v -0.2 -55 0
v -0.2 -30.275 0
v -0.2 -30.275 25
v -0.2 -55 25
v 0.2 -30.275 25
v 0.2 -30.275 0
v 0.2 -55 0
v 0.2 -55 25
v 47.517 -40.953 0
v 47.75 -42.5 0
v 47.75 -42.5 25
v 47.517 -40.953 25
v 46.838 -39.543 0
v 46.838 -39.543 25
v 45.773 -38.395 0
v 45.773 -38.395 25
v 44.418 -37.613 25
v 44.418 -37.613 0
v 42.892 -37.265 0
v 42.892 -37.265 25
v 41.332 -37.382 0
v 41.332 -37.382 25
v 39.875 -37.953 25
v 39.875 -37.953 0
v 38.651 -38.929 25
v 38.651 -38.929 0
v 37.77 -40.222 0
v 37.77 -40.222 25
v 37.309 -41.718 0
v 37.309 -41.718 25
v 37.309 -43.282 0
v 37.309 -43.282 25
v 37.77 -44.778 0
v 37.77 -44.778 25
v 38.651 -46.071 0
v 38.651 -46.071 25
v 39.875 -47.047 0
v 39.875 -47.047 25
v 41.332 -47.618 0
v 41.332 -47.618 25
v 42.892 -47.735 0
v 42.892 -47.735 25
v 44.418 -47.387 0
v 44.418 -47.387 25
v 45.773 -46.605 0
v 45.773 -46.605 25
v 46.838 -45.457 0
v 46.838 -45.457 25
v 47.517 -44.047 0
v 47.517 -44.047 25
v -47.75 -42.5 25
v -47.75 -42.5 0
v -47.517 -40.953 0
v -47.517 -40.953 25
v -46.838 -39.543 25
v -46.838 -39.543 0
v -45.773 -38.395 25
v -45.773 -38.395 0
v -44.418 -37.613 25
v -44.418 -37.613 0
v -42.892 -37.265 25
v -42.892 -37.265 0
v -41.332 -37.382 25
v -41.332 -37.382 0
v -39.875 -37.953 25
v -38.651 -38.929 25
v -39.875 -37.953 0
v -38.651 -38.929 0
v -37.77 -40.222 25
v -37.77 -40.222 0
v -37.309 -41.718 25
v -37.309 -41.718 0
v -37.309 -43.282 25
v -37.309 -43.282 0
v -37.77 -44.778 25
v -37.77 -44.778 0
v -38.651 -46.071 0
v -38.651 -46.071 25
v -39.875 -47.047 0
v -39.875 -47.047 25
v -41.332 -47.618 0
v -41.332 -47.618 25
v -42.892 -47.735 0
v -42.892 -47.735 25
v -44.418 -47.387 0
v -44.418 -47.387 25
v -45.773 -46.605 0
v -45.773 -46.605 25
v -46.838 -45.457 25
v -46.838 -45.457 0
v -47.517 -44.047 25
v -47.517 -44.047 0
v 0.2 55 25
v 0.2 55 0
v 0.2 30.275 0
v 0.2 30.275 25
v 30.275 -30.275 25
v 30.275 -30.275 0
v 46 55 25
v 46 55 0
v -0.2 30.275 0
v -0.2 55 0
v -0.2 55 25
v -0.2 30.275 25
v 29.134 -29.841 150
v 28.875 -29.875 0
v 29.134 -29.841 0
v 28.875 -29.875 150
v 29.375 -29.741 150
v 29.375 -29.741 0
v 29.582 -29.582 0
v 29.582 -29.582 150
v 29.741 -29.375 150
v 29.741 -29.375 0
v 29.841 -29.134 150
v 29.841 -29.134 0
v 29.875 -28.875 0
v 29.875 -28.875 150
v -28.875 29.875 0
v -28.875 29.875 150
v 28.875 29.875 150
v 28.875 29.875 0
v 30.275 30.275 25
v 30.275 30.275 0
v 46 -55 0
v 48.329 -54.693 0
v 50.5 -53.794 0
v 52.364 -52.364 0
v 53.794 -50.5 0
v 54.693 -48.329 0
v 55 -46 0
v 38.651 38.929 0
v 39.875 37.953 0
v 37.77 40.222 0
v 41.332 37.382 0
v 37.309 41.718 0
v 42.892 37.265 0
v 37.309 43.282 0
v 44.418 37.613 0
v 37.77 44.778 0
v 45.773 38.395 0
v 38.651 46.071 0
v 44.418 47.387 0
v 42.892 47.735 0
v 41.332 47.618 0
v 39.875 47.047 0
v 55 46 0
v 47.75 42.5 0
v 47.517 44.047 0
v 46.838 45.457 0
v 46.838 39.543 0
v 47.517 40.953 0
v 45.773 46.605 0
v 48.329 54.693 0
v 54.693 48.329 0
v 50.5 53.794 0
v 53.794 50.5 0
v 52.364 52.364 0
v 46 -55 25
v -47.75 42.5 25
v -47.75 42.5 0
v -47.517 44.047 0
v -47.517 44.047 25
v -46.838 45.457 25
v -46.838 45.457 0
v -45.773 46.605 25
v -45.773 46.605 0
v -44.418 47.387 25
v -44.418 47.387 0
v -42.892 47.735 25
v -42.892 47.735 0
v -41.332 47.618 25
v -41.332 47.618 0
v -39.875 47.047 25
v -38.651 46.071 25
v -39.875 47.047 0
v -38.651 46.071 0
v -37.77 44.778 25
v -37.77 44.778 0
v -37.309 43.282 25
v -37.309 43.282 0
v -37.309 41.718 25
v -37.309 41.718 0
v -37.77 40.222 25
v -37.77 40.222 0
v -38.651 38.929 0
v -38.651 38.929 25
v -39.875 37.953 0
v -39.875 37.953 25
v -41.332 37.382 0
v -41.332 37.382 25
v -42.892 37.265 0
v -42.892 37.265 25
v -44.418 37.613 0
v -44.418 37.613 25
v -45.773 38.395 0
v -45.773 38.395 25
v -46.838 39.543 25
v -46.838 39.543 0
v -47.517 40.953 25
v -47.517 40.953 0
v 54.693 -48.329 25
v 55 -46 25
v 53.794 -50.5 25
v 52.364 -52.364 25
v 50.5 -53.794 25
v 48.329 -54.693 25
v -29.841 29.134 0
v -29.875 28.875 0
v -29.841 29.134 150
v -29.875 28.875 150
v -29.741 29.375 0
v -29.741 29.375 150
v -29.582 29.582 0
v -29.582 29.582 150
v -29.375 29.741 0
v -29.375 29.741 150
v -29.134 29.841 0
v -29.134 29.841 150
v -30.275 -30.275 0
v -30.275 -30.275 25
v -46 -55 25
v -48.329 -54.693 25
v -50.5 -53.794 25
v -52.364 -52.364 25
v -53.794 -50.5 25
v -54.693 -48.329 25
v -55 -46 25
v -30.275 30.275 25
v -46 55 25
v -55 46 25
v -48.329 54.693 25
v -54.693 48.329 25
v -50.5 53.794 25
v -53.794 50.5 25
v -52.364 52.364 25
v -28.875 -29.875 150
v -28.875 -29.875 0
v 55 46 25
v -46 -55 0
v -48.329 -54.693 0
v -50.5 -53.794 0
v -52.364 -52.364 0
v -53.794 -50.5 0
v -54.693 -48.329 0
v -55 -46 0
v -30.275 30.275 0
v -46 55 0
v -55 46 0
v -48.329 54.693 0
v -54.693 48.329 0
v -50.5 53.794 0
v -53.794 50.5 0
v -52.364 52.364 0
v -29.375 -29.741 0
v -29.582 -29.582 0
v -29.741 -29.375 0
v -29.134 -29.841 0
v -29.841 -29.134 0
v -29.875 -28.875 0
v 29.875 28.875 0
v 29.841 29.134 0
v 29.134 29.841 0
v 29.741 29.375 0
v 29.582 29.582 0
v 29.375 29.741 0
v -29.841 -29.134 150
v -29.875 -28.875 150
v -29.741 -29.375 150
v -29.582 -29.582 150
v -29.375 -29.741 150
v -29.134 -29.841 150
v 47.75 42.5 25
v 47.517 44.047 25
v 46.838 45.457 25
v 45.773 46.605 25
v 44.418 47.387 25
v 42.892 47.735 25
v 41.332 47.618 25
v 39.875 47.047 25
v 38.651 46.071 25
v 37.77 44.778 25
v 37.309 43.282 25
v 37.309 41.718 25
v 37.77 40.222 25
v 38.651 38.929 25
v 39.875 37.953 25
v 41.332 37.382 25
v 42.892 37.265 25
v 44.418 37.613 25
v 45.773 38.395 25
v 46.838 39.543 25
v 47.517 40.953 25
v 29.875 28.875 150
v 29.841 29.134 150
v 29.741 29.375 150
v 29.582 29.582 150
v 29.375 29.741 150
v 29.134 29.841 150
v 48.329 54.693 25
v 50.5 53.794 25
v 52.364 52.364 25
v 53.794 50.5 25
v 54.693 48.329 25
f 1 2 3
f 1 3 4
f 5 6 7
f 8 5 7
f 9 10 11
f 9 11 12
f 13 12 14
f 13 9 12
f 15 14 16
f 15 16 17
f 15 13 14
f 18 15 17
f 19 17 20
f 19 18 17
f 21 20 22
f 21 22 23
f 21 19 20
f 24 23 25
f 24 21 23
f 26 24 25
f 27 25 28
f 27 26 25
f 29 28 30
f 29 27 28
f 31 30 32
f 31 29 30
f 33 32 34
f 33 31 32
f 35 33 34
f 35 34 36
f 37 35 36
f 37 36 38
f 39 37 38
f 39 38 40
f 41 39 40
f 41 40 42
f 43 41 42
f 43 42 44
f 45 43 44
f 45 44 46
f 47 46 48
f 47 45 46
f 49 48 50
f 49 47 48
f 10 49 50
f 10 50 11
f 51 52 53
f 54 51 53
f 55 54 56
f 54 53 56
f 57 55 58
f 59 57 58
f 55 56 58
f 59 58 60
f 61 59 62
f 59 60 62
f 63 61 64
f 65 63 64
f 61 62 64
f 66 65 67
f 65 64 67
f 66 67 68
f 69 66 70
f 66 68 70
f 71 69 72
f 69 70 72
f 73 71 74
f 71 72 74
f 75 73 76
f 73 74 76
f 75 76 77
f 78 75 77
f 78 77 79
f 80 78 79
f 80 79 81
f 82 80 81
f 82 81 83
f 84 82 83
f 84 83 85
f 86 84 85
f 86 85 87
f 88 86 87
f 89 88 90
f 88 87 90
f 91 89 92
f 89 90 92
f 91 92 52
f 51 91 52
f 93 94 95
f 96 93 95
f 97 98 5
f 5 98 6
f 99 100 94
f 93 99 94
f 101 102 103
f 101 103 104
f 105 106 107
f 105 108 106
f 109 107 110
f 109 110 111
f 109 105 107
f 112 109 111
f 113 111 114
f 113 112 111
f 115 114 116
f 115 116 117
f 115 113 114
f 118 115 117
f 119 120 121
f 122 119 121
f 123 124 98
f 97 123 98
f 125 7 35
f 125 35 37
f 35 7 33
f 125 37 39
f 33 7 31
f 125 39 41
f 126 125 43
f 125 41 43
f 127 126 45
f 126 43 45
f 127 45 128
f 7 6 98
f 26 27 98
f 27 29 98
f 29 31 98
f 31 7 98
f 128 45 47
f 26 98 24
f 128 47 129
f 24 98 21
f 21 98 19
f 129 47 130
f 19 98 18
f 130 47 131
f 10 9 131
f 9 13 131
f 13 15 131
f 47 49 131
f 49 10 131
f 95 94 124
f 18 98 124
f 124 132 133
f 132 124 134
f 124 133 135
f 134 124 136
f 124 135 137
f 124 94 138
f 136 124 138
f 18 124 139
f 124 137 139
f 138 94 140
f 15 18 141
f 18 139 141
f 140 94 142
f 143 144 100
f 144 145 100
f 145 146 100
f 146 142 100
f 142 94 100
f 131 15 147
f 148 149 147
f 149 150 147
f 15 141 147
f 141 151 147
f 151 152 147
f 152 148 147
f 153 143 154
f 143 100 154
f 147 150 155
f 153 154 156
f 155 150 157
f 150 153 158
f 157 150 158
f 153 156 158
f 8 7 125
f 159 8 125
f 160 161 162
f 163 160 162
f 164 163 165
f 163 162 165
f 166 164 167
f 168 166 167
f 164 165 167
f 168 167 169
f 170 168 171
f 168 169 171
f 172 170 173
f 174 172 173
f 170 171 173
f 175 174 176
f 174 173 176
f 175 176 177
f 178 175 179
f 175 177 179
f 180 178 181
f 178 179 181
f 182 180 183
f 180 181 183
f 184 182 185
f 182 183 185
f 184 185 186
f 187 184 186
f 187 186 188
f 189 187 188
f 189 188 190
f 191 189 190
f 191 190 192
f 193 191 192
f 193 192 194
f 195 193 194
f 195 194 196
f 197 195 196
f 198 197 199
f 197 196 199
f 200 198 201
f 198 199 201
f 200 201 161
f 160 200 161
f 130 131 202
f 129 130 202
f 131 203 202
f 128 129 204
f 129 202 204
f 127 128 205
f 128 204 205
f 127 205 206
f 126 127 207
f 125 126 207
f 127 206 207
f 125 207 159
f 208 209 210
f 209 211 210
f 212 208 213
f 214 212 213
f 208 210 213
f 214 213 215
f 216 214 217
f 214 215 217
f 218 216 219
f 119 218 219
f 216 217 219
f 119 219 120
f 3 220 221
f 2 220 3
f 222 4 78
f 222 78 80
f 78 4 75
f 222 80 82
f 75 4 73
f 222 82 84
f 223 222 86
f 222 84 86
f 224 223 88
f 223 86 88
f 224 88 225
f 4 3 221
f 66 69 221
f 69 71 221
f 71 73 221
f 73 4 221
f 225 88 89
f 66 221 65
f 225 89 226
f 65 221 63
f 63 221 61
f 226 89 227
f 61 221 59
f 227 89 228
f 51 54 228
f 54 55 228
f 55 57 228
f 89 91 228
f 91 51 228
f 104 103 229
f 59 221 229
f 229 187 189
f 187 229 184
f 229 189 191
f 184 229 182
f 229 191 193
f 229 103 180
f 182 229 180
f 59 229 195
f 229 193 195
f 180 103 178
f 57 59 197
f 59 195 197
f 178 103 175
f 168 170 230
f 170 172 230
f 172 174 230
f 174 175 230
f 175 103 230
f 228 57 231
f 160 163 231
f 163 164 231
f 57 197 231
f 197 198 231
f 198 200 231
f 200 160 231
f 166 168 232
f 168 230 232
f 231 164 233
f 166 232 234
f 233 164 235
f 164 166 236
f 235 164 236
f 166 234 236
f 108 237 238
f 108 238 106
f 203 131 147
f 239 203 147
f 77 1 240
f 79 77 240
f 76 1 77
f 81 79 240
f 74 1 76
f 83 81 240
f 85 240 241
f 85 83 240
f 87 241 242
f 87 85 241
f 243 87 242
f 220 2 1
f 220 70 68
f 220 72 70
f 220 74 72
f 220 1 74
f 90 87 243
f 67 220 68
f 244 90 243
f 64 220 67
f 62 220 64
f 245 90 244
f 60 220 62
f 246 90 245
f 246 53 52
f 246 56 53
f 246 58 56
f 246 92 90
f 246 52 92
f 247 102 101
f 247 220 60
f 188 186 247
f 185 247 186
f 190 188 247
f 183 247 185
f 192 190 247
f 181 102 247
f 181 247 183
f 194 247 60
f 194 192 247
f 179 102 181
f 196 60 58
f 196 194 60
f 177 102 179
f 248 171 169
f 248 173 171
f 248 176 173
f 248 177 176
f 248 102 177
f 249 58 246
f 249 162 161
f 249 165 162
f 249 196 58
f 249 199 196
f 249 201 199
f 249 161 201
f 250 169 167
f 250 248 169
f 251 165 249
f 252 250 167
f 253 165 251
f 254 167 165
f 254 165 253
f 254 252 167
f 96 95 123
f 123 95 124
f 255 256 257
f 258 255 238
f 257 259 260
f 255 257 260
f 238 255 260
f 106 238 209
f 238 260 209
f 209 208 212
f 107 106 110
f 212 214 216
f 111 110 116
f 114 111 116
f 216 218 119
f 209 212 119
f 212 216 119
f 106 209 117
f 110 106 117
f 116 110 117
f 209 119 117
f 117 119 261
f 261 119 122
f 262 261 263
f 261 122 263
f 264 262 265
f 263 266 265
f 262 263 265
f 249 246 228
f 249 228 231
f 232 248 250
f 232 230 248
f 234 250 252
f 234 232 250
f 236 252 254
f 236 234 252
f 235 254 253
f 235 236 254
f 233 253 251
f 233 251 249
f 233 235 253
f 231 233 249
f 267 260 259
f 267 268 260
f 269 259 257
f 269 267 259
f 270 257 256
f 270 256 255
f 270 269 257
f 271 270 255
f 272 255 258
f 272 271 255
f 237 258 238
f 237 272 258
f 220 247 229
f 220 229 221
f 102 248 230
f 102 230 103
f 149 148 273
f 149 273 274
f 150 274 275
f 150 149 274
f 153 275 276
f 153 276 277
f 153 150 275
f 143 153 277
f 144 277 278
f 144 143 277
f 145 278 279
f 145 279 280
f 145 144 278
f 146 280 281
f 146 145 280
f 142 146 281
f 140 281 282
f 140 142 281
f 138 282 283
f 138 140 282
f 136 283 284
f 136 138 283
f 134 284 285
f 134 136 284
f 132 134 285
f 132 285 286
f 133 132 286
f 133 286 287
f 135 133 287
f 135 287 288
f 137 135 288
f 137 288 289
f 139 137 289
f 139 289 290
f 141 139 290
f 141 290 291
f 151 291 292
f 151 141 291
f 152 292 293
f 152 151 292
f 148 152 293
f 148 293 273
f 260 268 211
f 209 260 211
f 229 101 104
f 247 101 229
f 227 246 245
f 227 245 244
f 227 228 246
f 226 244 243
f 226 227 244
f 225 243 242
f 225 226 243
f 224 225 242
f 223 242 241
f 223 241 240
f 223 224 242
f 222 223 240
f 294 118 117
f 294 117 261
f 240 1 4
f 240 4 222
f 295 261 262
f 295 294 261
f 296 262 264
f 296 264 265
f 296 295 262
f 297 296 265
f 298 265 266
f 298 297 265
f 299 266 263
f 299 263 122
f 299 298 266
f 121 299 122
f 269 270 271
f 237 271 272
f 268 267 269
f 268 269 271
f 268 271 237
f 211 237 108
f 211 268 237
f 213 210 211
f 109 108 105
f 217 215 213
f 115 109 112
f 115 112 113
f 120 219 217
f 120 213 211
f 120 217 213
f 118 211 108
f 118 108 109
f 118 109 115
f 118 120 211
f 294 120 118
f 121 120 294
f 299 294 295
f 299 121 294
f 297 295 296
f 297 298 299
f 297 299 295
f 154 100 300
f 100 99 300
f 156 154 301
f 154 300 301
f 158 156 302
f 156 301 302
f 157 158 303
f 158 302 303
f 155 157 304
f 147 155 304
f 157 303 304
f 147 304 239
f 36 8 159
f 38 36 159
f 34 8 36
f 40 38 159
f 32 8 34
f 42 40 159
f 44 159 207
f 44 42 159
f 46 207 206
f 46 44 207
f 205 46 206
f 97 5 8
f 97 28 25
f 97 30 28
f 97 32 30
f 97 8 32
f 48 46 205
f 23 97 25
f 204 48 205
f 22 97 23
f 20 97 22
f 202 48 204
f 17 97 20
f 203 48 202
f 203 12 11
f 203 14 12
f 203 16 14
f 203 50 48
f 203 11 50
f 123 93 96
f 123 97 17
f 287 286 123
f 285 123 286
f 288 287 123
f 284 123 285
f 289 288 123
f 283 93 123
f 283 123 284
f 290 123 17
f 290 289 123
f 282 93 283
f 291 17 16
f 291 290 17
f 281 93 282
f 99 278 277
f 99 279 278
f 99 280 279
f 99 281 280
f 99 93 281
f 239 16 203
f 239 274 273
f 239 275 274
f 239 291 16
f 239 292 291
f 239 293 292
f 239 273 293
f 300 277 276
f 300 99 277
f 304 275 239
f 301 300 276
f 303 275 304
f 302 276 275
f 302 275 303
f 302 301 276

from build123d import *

# Parameters (mm, degrees)
F0_R     = 5.25
F1_DEPTH = 25
F2_R     = 9
F4_W     = 59.75
F4_H     = 59.75
F5_DEPTH = 150
F6_R     = 1


with BuildPart() as f1:
    # F0 (on Top) → F1 (new body)
    with BuildSketch(Plane.XY):
        Polygon((0.2, 30.275), (30.275, 30.275), (30.275, 0), (30.275, -30.275), (0.2, -30.275), (0.2, -55), (55, -55), (55, 0), (55, 55), (0.2, 55), align=None)
        with Locations((42.5, -42.5)):
            Circle(F0_R, mode=Mode.SUBTRACT)
        with Locations((42.5, 42.5)):
            Circle(F0_R, mode=Mode.SUBTRACT)
    extrude(amount=F1_DEPTH)

    # F2
    f2_edges = [f1.edges().sort_by_distance(p)[0] for p in [
        (55, -55, 12.5),
        (55, 55, 12.5),
    ]]
    fillet(f2_edges, radius=F2_R)


with BuildPart() as f3_1:
    # F3: instance of F1
    add(f1.part.mirror(Plane.YZ))


with BuildPart() as f5:
    # F4 (on Top) → F5 (new body)
    with BuildSketch(Plane.XY):
        Rectangle(F4_W, F4_H)
    extrude(amount=F5_DEPTH)

    # F6
    f6_edges = [f5.edges().sort_by_distance(p)[0] for p in [
        (-29.875, -29.875, 75),
        (-29.875, 29.875, 75),
        (29.875, -29.875, 75),
        (29.875, 29.875, 75),
    ]]
    fillet(f6_edges, radius=F6_R)


solid = Compound([f1.part, f3_1.part, f5.part])
